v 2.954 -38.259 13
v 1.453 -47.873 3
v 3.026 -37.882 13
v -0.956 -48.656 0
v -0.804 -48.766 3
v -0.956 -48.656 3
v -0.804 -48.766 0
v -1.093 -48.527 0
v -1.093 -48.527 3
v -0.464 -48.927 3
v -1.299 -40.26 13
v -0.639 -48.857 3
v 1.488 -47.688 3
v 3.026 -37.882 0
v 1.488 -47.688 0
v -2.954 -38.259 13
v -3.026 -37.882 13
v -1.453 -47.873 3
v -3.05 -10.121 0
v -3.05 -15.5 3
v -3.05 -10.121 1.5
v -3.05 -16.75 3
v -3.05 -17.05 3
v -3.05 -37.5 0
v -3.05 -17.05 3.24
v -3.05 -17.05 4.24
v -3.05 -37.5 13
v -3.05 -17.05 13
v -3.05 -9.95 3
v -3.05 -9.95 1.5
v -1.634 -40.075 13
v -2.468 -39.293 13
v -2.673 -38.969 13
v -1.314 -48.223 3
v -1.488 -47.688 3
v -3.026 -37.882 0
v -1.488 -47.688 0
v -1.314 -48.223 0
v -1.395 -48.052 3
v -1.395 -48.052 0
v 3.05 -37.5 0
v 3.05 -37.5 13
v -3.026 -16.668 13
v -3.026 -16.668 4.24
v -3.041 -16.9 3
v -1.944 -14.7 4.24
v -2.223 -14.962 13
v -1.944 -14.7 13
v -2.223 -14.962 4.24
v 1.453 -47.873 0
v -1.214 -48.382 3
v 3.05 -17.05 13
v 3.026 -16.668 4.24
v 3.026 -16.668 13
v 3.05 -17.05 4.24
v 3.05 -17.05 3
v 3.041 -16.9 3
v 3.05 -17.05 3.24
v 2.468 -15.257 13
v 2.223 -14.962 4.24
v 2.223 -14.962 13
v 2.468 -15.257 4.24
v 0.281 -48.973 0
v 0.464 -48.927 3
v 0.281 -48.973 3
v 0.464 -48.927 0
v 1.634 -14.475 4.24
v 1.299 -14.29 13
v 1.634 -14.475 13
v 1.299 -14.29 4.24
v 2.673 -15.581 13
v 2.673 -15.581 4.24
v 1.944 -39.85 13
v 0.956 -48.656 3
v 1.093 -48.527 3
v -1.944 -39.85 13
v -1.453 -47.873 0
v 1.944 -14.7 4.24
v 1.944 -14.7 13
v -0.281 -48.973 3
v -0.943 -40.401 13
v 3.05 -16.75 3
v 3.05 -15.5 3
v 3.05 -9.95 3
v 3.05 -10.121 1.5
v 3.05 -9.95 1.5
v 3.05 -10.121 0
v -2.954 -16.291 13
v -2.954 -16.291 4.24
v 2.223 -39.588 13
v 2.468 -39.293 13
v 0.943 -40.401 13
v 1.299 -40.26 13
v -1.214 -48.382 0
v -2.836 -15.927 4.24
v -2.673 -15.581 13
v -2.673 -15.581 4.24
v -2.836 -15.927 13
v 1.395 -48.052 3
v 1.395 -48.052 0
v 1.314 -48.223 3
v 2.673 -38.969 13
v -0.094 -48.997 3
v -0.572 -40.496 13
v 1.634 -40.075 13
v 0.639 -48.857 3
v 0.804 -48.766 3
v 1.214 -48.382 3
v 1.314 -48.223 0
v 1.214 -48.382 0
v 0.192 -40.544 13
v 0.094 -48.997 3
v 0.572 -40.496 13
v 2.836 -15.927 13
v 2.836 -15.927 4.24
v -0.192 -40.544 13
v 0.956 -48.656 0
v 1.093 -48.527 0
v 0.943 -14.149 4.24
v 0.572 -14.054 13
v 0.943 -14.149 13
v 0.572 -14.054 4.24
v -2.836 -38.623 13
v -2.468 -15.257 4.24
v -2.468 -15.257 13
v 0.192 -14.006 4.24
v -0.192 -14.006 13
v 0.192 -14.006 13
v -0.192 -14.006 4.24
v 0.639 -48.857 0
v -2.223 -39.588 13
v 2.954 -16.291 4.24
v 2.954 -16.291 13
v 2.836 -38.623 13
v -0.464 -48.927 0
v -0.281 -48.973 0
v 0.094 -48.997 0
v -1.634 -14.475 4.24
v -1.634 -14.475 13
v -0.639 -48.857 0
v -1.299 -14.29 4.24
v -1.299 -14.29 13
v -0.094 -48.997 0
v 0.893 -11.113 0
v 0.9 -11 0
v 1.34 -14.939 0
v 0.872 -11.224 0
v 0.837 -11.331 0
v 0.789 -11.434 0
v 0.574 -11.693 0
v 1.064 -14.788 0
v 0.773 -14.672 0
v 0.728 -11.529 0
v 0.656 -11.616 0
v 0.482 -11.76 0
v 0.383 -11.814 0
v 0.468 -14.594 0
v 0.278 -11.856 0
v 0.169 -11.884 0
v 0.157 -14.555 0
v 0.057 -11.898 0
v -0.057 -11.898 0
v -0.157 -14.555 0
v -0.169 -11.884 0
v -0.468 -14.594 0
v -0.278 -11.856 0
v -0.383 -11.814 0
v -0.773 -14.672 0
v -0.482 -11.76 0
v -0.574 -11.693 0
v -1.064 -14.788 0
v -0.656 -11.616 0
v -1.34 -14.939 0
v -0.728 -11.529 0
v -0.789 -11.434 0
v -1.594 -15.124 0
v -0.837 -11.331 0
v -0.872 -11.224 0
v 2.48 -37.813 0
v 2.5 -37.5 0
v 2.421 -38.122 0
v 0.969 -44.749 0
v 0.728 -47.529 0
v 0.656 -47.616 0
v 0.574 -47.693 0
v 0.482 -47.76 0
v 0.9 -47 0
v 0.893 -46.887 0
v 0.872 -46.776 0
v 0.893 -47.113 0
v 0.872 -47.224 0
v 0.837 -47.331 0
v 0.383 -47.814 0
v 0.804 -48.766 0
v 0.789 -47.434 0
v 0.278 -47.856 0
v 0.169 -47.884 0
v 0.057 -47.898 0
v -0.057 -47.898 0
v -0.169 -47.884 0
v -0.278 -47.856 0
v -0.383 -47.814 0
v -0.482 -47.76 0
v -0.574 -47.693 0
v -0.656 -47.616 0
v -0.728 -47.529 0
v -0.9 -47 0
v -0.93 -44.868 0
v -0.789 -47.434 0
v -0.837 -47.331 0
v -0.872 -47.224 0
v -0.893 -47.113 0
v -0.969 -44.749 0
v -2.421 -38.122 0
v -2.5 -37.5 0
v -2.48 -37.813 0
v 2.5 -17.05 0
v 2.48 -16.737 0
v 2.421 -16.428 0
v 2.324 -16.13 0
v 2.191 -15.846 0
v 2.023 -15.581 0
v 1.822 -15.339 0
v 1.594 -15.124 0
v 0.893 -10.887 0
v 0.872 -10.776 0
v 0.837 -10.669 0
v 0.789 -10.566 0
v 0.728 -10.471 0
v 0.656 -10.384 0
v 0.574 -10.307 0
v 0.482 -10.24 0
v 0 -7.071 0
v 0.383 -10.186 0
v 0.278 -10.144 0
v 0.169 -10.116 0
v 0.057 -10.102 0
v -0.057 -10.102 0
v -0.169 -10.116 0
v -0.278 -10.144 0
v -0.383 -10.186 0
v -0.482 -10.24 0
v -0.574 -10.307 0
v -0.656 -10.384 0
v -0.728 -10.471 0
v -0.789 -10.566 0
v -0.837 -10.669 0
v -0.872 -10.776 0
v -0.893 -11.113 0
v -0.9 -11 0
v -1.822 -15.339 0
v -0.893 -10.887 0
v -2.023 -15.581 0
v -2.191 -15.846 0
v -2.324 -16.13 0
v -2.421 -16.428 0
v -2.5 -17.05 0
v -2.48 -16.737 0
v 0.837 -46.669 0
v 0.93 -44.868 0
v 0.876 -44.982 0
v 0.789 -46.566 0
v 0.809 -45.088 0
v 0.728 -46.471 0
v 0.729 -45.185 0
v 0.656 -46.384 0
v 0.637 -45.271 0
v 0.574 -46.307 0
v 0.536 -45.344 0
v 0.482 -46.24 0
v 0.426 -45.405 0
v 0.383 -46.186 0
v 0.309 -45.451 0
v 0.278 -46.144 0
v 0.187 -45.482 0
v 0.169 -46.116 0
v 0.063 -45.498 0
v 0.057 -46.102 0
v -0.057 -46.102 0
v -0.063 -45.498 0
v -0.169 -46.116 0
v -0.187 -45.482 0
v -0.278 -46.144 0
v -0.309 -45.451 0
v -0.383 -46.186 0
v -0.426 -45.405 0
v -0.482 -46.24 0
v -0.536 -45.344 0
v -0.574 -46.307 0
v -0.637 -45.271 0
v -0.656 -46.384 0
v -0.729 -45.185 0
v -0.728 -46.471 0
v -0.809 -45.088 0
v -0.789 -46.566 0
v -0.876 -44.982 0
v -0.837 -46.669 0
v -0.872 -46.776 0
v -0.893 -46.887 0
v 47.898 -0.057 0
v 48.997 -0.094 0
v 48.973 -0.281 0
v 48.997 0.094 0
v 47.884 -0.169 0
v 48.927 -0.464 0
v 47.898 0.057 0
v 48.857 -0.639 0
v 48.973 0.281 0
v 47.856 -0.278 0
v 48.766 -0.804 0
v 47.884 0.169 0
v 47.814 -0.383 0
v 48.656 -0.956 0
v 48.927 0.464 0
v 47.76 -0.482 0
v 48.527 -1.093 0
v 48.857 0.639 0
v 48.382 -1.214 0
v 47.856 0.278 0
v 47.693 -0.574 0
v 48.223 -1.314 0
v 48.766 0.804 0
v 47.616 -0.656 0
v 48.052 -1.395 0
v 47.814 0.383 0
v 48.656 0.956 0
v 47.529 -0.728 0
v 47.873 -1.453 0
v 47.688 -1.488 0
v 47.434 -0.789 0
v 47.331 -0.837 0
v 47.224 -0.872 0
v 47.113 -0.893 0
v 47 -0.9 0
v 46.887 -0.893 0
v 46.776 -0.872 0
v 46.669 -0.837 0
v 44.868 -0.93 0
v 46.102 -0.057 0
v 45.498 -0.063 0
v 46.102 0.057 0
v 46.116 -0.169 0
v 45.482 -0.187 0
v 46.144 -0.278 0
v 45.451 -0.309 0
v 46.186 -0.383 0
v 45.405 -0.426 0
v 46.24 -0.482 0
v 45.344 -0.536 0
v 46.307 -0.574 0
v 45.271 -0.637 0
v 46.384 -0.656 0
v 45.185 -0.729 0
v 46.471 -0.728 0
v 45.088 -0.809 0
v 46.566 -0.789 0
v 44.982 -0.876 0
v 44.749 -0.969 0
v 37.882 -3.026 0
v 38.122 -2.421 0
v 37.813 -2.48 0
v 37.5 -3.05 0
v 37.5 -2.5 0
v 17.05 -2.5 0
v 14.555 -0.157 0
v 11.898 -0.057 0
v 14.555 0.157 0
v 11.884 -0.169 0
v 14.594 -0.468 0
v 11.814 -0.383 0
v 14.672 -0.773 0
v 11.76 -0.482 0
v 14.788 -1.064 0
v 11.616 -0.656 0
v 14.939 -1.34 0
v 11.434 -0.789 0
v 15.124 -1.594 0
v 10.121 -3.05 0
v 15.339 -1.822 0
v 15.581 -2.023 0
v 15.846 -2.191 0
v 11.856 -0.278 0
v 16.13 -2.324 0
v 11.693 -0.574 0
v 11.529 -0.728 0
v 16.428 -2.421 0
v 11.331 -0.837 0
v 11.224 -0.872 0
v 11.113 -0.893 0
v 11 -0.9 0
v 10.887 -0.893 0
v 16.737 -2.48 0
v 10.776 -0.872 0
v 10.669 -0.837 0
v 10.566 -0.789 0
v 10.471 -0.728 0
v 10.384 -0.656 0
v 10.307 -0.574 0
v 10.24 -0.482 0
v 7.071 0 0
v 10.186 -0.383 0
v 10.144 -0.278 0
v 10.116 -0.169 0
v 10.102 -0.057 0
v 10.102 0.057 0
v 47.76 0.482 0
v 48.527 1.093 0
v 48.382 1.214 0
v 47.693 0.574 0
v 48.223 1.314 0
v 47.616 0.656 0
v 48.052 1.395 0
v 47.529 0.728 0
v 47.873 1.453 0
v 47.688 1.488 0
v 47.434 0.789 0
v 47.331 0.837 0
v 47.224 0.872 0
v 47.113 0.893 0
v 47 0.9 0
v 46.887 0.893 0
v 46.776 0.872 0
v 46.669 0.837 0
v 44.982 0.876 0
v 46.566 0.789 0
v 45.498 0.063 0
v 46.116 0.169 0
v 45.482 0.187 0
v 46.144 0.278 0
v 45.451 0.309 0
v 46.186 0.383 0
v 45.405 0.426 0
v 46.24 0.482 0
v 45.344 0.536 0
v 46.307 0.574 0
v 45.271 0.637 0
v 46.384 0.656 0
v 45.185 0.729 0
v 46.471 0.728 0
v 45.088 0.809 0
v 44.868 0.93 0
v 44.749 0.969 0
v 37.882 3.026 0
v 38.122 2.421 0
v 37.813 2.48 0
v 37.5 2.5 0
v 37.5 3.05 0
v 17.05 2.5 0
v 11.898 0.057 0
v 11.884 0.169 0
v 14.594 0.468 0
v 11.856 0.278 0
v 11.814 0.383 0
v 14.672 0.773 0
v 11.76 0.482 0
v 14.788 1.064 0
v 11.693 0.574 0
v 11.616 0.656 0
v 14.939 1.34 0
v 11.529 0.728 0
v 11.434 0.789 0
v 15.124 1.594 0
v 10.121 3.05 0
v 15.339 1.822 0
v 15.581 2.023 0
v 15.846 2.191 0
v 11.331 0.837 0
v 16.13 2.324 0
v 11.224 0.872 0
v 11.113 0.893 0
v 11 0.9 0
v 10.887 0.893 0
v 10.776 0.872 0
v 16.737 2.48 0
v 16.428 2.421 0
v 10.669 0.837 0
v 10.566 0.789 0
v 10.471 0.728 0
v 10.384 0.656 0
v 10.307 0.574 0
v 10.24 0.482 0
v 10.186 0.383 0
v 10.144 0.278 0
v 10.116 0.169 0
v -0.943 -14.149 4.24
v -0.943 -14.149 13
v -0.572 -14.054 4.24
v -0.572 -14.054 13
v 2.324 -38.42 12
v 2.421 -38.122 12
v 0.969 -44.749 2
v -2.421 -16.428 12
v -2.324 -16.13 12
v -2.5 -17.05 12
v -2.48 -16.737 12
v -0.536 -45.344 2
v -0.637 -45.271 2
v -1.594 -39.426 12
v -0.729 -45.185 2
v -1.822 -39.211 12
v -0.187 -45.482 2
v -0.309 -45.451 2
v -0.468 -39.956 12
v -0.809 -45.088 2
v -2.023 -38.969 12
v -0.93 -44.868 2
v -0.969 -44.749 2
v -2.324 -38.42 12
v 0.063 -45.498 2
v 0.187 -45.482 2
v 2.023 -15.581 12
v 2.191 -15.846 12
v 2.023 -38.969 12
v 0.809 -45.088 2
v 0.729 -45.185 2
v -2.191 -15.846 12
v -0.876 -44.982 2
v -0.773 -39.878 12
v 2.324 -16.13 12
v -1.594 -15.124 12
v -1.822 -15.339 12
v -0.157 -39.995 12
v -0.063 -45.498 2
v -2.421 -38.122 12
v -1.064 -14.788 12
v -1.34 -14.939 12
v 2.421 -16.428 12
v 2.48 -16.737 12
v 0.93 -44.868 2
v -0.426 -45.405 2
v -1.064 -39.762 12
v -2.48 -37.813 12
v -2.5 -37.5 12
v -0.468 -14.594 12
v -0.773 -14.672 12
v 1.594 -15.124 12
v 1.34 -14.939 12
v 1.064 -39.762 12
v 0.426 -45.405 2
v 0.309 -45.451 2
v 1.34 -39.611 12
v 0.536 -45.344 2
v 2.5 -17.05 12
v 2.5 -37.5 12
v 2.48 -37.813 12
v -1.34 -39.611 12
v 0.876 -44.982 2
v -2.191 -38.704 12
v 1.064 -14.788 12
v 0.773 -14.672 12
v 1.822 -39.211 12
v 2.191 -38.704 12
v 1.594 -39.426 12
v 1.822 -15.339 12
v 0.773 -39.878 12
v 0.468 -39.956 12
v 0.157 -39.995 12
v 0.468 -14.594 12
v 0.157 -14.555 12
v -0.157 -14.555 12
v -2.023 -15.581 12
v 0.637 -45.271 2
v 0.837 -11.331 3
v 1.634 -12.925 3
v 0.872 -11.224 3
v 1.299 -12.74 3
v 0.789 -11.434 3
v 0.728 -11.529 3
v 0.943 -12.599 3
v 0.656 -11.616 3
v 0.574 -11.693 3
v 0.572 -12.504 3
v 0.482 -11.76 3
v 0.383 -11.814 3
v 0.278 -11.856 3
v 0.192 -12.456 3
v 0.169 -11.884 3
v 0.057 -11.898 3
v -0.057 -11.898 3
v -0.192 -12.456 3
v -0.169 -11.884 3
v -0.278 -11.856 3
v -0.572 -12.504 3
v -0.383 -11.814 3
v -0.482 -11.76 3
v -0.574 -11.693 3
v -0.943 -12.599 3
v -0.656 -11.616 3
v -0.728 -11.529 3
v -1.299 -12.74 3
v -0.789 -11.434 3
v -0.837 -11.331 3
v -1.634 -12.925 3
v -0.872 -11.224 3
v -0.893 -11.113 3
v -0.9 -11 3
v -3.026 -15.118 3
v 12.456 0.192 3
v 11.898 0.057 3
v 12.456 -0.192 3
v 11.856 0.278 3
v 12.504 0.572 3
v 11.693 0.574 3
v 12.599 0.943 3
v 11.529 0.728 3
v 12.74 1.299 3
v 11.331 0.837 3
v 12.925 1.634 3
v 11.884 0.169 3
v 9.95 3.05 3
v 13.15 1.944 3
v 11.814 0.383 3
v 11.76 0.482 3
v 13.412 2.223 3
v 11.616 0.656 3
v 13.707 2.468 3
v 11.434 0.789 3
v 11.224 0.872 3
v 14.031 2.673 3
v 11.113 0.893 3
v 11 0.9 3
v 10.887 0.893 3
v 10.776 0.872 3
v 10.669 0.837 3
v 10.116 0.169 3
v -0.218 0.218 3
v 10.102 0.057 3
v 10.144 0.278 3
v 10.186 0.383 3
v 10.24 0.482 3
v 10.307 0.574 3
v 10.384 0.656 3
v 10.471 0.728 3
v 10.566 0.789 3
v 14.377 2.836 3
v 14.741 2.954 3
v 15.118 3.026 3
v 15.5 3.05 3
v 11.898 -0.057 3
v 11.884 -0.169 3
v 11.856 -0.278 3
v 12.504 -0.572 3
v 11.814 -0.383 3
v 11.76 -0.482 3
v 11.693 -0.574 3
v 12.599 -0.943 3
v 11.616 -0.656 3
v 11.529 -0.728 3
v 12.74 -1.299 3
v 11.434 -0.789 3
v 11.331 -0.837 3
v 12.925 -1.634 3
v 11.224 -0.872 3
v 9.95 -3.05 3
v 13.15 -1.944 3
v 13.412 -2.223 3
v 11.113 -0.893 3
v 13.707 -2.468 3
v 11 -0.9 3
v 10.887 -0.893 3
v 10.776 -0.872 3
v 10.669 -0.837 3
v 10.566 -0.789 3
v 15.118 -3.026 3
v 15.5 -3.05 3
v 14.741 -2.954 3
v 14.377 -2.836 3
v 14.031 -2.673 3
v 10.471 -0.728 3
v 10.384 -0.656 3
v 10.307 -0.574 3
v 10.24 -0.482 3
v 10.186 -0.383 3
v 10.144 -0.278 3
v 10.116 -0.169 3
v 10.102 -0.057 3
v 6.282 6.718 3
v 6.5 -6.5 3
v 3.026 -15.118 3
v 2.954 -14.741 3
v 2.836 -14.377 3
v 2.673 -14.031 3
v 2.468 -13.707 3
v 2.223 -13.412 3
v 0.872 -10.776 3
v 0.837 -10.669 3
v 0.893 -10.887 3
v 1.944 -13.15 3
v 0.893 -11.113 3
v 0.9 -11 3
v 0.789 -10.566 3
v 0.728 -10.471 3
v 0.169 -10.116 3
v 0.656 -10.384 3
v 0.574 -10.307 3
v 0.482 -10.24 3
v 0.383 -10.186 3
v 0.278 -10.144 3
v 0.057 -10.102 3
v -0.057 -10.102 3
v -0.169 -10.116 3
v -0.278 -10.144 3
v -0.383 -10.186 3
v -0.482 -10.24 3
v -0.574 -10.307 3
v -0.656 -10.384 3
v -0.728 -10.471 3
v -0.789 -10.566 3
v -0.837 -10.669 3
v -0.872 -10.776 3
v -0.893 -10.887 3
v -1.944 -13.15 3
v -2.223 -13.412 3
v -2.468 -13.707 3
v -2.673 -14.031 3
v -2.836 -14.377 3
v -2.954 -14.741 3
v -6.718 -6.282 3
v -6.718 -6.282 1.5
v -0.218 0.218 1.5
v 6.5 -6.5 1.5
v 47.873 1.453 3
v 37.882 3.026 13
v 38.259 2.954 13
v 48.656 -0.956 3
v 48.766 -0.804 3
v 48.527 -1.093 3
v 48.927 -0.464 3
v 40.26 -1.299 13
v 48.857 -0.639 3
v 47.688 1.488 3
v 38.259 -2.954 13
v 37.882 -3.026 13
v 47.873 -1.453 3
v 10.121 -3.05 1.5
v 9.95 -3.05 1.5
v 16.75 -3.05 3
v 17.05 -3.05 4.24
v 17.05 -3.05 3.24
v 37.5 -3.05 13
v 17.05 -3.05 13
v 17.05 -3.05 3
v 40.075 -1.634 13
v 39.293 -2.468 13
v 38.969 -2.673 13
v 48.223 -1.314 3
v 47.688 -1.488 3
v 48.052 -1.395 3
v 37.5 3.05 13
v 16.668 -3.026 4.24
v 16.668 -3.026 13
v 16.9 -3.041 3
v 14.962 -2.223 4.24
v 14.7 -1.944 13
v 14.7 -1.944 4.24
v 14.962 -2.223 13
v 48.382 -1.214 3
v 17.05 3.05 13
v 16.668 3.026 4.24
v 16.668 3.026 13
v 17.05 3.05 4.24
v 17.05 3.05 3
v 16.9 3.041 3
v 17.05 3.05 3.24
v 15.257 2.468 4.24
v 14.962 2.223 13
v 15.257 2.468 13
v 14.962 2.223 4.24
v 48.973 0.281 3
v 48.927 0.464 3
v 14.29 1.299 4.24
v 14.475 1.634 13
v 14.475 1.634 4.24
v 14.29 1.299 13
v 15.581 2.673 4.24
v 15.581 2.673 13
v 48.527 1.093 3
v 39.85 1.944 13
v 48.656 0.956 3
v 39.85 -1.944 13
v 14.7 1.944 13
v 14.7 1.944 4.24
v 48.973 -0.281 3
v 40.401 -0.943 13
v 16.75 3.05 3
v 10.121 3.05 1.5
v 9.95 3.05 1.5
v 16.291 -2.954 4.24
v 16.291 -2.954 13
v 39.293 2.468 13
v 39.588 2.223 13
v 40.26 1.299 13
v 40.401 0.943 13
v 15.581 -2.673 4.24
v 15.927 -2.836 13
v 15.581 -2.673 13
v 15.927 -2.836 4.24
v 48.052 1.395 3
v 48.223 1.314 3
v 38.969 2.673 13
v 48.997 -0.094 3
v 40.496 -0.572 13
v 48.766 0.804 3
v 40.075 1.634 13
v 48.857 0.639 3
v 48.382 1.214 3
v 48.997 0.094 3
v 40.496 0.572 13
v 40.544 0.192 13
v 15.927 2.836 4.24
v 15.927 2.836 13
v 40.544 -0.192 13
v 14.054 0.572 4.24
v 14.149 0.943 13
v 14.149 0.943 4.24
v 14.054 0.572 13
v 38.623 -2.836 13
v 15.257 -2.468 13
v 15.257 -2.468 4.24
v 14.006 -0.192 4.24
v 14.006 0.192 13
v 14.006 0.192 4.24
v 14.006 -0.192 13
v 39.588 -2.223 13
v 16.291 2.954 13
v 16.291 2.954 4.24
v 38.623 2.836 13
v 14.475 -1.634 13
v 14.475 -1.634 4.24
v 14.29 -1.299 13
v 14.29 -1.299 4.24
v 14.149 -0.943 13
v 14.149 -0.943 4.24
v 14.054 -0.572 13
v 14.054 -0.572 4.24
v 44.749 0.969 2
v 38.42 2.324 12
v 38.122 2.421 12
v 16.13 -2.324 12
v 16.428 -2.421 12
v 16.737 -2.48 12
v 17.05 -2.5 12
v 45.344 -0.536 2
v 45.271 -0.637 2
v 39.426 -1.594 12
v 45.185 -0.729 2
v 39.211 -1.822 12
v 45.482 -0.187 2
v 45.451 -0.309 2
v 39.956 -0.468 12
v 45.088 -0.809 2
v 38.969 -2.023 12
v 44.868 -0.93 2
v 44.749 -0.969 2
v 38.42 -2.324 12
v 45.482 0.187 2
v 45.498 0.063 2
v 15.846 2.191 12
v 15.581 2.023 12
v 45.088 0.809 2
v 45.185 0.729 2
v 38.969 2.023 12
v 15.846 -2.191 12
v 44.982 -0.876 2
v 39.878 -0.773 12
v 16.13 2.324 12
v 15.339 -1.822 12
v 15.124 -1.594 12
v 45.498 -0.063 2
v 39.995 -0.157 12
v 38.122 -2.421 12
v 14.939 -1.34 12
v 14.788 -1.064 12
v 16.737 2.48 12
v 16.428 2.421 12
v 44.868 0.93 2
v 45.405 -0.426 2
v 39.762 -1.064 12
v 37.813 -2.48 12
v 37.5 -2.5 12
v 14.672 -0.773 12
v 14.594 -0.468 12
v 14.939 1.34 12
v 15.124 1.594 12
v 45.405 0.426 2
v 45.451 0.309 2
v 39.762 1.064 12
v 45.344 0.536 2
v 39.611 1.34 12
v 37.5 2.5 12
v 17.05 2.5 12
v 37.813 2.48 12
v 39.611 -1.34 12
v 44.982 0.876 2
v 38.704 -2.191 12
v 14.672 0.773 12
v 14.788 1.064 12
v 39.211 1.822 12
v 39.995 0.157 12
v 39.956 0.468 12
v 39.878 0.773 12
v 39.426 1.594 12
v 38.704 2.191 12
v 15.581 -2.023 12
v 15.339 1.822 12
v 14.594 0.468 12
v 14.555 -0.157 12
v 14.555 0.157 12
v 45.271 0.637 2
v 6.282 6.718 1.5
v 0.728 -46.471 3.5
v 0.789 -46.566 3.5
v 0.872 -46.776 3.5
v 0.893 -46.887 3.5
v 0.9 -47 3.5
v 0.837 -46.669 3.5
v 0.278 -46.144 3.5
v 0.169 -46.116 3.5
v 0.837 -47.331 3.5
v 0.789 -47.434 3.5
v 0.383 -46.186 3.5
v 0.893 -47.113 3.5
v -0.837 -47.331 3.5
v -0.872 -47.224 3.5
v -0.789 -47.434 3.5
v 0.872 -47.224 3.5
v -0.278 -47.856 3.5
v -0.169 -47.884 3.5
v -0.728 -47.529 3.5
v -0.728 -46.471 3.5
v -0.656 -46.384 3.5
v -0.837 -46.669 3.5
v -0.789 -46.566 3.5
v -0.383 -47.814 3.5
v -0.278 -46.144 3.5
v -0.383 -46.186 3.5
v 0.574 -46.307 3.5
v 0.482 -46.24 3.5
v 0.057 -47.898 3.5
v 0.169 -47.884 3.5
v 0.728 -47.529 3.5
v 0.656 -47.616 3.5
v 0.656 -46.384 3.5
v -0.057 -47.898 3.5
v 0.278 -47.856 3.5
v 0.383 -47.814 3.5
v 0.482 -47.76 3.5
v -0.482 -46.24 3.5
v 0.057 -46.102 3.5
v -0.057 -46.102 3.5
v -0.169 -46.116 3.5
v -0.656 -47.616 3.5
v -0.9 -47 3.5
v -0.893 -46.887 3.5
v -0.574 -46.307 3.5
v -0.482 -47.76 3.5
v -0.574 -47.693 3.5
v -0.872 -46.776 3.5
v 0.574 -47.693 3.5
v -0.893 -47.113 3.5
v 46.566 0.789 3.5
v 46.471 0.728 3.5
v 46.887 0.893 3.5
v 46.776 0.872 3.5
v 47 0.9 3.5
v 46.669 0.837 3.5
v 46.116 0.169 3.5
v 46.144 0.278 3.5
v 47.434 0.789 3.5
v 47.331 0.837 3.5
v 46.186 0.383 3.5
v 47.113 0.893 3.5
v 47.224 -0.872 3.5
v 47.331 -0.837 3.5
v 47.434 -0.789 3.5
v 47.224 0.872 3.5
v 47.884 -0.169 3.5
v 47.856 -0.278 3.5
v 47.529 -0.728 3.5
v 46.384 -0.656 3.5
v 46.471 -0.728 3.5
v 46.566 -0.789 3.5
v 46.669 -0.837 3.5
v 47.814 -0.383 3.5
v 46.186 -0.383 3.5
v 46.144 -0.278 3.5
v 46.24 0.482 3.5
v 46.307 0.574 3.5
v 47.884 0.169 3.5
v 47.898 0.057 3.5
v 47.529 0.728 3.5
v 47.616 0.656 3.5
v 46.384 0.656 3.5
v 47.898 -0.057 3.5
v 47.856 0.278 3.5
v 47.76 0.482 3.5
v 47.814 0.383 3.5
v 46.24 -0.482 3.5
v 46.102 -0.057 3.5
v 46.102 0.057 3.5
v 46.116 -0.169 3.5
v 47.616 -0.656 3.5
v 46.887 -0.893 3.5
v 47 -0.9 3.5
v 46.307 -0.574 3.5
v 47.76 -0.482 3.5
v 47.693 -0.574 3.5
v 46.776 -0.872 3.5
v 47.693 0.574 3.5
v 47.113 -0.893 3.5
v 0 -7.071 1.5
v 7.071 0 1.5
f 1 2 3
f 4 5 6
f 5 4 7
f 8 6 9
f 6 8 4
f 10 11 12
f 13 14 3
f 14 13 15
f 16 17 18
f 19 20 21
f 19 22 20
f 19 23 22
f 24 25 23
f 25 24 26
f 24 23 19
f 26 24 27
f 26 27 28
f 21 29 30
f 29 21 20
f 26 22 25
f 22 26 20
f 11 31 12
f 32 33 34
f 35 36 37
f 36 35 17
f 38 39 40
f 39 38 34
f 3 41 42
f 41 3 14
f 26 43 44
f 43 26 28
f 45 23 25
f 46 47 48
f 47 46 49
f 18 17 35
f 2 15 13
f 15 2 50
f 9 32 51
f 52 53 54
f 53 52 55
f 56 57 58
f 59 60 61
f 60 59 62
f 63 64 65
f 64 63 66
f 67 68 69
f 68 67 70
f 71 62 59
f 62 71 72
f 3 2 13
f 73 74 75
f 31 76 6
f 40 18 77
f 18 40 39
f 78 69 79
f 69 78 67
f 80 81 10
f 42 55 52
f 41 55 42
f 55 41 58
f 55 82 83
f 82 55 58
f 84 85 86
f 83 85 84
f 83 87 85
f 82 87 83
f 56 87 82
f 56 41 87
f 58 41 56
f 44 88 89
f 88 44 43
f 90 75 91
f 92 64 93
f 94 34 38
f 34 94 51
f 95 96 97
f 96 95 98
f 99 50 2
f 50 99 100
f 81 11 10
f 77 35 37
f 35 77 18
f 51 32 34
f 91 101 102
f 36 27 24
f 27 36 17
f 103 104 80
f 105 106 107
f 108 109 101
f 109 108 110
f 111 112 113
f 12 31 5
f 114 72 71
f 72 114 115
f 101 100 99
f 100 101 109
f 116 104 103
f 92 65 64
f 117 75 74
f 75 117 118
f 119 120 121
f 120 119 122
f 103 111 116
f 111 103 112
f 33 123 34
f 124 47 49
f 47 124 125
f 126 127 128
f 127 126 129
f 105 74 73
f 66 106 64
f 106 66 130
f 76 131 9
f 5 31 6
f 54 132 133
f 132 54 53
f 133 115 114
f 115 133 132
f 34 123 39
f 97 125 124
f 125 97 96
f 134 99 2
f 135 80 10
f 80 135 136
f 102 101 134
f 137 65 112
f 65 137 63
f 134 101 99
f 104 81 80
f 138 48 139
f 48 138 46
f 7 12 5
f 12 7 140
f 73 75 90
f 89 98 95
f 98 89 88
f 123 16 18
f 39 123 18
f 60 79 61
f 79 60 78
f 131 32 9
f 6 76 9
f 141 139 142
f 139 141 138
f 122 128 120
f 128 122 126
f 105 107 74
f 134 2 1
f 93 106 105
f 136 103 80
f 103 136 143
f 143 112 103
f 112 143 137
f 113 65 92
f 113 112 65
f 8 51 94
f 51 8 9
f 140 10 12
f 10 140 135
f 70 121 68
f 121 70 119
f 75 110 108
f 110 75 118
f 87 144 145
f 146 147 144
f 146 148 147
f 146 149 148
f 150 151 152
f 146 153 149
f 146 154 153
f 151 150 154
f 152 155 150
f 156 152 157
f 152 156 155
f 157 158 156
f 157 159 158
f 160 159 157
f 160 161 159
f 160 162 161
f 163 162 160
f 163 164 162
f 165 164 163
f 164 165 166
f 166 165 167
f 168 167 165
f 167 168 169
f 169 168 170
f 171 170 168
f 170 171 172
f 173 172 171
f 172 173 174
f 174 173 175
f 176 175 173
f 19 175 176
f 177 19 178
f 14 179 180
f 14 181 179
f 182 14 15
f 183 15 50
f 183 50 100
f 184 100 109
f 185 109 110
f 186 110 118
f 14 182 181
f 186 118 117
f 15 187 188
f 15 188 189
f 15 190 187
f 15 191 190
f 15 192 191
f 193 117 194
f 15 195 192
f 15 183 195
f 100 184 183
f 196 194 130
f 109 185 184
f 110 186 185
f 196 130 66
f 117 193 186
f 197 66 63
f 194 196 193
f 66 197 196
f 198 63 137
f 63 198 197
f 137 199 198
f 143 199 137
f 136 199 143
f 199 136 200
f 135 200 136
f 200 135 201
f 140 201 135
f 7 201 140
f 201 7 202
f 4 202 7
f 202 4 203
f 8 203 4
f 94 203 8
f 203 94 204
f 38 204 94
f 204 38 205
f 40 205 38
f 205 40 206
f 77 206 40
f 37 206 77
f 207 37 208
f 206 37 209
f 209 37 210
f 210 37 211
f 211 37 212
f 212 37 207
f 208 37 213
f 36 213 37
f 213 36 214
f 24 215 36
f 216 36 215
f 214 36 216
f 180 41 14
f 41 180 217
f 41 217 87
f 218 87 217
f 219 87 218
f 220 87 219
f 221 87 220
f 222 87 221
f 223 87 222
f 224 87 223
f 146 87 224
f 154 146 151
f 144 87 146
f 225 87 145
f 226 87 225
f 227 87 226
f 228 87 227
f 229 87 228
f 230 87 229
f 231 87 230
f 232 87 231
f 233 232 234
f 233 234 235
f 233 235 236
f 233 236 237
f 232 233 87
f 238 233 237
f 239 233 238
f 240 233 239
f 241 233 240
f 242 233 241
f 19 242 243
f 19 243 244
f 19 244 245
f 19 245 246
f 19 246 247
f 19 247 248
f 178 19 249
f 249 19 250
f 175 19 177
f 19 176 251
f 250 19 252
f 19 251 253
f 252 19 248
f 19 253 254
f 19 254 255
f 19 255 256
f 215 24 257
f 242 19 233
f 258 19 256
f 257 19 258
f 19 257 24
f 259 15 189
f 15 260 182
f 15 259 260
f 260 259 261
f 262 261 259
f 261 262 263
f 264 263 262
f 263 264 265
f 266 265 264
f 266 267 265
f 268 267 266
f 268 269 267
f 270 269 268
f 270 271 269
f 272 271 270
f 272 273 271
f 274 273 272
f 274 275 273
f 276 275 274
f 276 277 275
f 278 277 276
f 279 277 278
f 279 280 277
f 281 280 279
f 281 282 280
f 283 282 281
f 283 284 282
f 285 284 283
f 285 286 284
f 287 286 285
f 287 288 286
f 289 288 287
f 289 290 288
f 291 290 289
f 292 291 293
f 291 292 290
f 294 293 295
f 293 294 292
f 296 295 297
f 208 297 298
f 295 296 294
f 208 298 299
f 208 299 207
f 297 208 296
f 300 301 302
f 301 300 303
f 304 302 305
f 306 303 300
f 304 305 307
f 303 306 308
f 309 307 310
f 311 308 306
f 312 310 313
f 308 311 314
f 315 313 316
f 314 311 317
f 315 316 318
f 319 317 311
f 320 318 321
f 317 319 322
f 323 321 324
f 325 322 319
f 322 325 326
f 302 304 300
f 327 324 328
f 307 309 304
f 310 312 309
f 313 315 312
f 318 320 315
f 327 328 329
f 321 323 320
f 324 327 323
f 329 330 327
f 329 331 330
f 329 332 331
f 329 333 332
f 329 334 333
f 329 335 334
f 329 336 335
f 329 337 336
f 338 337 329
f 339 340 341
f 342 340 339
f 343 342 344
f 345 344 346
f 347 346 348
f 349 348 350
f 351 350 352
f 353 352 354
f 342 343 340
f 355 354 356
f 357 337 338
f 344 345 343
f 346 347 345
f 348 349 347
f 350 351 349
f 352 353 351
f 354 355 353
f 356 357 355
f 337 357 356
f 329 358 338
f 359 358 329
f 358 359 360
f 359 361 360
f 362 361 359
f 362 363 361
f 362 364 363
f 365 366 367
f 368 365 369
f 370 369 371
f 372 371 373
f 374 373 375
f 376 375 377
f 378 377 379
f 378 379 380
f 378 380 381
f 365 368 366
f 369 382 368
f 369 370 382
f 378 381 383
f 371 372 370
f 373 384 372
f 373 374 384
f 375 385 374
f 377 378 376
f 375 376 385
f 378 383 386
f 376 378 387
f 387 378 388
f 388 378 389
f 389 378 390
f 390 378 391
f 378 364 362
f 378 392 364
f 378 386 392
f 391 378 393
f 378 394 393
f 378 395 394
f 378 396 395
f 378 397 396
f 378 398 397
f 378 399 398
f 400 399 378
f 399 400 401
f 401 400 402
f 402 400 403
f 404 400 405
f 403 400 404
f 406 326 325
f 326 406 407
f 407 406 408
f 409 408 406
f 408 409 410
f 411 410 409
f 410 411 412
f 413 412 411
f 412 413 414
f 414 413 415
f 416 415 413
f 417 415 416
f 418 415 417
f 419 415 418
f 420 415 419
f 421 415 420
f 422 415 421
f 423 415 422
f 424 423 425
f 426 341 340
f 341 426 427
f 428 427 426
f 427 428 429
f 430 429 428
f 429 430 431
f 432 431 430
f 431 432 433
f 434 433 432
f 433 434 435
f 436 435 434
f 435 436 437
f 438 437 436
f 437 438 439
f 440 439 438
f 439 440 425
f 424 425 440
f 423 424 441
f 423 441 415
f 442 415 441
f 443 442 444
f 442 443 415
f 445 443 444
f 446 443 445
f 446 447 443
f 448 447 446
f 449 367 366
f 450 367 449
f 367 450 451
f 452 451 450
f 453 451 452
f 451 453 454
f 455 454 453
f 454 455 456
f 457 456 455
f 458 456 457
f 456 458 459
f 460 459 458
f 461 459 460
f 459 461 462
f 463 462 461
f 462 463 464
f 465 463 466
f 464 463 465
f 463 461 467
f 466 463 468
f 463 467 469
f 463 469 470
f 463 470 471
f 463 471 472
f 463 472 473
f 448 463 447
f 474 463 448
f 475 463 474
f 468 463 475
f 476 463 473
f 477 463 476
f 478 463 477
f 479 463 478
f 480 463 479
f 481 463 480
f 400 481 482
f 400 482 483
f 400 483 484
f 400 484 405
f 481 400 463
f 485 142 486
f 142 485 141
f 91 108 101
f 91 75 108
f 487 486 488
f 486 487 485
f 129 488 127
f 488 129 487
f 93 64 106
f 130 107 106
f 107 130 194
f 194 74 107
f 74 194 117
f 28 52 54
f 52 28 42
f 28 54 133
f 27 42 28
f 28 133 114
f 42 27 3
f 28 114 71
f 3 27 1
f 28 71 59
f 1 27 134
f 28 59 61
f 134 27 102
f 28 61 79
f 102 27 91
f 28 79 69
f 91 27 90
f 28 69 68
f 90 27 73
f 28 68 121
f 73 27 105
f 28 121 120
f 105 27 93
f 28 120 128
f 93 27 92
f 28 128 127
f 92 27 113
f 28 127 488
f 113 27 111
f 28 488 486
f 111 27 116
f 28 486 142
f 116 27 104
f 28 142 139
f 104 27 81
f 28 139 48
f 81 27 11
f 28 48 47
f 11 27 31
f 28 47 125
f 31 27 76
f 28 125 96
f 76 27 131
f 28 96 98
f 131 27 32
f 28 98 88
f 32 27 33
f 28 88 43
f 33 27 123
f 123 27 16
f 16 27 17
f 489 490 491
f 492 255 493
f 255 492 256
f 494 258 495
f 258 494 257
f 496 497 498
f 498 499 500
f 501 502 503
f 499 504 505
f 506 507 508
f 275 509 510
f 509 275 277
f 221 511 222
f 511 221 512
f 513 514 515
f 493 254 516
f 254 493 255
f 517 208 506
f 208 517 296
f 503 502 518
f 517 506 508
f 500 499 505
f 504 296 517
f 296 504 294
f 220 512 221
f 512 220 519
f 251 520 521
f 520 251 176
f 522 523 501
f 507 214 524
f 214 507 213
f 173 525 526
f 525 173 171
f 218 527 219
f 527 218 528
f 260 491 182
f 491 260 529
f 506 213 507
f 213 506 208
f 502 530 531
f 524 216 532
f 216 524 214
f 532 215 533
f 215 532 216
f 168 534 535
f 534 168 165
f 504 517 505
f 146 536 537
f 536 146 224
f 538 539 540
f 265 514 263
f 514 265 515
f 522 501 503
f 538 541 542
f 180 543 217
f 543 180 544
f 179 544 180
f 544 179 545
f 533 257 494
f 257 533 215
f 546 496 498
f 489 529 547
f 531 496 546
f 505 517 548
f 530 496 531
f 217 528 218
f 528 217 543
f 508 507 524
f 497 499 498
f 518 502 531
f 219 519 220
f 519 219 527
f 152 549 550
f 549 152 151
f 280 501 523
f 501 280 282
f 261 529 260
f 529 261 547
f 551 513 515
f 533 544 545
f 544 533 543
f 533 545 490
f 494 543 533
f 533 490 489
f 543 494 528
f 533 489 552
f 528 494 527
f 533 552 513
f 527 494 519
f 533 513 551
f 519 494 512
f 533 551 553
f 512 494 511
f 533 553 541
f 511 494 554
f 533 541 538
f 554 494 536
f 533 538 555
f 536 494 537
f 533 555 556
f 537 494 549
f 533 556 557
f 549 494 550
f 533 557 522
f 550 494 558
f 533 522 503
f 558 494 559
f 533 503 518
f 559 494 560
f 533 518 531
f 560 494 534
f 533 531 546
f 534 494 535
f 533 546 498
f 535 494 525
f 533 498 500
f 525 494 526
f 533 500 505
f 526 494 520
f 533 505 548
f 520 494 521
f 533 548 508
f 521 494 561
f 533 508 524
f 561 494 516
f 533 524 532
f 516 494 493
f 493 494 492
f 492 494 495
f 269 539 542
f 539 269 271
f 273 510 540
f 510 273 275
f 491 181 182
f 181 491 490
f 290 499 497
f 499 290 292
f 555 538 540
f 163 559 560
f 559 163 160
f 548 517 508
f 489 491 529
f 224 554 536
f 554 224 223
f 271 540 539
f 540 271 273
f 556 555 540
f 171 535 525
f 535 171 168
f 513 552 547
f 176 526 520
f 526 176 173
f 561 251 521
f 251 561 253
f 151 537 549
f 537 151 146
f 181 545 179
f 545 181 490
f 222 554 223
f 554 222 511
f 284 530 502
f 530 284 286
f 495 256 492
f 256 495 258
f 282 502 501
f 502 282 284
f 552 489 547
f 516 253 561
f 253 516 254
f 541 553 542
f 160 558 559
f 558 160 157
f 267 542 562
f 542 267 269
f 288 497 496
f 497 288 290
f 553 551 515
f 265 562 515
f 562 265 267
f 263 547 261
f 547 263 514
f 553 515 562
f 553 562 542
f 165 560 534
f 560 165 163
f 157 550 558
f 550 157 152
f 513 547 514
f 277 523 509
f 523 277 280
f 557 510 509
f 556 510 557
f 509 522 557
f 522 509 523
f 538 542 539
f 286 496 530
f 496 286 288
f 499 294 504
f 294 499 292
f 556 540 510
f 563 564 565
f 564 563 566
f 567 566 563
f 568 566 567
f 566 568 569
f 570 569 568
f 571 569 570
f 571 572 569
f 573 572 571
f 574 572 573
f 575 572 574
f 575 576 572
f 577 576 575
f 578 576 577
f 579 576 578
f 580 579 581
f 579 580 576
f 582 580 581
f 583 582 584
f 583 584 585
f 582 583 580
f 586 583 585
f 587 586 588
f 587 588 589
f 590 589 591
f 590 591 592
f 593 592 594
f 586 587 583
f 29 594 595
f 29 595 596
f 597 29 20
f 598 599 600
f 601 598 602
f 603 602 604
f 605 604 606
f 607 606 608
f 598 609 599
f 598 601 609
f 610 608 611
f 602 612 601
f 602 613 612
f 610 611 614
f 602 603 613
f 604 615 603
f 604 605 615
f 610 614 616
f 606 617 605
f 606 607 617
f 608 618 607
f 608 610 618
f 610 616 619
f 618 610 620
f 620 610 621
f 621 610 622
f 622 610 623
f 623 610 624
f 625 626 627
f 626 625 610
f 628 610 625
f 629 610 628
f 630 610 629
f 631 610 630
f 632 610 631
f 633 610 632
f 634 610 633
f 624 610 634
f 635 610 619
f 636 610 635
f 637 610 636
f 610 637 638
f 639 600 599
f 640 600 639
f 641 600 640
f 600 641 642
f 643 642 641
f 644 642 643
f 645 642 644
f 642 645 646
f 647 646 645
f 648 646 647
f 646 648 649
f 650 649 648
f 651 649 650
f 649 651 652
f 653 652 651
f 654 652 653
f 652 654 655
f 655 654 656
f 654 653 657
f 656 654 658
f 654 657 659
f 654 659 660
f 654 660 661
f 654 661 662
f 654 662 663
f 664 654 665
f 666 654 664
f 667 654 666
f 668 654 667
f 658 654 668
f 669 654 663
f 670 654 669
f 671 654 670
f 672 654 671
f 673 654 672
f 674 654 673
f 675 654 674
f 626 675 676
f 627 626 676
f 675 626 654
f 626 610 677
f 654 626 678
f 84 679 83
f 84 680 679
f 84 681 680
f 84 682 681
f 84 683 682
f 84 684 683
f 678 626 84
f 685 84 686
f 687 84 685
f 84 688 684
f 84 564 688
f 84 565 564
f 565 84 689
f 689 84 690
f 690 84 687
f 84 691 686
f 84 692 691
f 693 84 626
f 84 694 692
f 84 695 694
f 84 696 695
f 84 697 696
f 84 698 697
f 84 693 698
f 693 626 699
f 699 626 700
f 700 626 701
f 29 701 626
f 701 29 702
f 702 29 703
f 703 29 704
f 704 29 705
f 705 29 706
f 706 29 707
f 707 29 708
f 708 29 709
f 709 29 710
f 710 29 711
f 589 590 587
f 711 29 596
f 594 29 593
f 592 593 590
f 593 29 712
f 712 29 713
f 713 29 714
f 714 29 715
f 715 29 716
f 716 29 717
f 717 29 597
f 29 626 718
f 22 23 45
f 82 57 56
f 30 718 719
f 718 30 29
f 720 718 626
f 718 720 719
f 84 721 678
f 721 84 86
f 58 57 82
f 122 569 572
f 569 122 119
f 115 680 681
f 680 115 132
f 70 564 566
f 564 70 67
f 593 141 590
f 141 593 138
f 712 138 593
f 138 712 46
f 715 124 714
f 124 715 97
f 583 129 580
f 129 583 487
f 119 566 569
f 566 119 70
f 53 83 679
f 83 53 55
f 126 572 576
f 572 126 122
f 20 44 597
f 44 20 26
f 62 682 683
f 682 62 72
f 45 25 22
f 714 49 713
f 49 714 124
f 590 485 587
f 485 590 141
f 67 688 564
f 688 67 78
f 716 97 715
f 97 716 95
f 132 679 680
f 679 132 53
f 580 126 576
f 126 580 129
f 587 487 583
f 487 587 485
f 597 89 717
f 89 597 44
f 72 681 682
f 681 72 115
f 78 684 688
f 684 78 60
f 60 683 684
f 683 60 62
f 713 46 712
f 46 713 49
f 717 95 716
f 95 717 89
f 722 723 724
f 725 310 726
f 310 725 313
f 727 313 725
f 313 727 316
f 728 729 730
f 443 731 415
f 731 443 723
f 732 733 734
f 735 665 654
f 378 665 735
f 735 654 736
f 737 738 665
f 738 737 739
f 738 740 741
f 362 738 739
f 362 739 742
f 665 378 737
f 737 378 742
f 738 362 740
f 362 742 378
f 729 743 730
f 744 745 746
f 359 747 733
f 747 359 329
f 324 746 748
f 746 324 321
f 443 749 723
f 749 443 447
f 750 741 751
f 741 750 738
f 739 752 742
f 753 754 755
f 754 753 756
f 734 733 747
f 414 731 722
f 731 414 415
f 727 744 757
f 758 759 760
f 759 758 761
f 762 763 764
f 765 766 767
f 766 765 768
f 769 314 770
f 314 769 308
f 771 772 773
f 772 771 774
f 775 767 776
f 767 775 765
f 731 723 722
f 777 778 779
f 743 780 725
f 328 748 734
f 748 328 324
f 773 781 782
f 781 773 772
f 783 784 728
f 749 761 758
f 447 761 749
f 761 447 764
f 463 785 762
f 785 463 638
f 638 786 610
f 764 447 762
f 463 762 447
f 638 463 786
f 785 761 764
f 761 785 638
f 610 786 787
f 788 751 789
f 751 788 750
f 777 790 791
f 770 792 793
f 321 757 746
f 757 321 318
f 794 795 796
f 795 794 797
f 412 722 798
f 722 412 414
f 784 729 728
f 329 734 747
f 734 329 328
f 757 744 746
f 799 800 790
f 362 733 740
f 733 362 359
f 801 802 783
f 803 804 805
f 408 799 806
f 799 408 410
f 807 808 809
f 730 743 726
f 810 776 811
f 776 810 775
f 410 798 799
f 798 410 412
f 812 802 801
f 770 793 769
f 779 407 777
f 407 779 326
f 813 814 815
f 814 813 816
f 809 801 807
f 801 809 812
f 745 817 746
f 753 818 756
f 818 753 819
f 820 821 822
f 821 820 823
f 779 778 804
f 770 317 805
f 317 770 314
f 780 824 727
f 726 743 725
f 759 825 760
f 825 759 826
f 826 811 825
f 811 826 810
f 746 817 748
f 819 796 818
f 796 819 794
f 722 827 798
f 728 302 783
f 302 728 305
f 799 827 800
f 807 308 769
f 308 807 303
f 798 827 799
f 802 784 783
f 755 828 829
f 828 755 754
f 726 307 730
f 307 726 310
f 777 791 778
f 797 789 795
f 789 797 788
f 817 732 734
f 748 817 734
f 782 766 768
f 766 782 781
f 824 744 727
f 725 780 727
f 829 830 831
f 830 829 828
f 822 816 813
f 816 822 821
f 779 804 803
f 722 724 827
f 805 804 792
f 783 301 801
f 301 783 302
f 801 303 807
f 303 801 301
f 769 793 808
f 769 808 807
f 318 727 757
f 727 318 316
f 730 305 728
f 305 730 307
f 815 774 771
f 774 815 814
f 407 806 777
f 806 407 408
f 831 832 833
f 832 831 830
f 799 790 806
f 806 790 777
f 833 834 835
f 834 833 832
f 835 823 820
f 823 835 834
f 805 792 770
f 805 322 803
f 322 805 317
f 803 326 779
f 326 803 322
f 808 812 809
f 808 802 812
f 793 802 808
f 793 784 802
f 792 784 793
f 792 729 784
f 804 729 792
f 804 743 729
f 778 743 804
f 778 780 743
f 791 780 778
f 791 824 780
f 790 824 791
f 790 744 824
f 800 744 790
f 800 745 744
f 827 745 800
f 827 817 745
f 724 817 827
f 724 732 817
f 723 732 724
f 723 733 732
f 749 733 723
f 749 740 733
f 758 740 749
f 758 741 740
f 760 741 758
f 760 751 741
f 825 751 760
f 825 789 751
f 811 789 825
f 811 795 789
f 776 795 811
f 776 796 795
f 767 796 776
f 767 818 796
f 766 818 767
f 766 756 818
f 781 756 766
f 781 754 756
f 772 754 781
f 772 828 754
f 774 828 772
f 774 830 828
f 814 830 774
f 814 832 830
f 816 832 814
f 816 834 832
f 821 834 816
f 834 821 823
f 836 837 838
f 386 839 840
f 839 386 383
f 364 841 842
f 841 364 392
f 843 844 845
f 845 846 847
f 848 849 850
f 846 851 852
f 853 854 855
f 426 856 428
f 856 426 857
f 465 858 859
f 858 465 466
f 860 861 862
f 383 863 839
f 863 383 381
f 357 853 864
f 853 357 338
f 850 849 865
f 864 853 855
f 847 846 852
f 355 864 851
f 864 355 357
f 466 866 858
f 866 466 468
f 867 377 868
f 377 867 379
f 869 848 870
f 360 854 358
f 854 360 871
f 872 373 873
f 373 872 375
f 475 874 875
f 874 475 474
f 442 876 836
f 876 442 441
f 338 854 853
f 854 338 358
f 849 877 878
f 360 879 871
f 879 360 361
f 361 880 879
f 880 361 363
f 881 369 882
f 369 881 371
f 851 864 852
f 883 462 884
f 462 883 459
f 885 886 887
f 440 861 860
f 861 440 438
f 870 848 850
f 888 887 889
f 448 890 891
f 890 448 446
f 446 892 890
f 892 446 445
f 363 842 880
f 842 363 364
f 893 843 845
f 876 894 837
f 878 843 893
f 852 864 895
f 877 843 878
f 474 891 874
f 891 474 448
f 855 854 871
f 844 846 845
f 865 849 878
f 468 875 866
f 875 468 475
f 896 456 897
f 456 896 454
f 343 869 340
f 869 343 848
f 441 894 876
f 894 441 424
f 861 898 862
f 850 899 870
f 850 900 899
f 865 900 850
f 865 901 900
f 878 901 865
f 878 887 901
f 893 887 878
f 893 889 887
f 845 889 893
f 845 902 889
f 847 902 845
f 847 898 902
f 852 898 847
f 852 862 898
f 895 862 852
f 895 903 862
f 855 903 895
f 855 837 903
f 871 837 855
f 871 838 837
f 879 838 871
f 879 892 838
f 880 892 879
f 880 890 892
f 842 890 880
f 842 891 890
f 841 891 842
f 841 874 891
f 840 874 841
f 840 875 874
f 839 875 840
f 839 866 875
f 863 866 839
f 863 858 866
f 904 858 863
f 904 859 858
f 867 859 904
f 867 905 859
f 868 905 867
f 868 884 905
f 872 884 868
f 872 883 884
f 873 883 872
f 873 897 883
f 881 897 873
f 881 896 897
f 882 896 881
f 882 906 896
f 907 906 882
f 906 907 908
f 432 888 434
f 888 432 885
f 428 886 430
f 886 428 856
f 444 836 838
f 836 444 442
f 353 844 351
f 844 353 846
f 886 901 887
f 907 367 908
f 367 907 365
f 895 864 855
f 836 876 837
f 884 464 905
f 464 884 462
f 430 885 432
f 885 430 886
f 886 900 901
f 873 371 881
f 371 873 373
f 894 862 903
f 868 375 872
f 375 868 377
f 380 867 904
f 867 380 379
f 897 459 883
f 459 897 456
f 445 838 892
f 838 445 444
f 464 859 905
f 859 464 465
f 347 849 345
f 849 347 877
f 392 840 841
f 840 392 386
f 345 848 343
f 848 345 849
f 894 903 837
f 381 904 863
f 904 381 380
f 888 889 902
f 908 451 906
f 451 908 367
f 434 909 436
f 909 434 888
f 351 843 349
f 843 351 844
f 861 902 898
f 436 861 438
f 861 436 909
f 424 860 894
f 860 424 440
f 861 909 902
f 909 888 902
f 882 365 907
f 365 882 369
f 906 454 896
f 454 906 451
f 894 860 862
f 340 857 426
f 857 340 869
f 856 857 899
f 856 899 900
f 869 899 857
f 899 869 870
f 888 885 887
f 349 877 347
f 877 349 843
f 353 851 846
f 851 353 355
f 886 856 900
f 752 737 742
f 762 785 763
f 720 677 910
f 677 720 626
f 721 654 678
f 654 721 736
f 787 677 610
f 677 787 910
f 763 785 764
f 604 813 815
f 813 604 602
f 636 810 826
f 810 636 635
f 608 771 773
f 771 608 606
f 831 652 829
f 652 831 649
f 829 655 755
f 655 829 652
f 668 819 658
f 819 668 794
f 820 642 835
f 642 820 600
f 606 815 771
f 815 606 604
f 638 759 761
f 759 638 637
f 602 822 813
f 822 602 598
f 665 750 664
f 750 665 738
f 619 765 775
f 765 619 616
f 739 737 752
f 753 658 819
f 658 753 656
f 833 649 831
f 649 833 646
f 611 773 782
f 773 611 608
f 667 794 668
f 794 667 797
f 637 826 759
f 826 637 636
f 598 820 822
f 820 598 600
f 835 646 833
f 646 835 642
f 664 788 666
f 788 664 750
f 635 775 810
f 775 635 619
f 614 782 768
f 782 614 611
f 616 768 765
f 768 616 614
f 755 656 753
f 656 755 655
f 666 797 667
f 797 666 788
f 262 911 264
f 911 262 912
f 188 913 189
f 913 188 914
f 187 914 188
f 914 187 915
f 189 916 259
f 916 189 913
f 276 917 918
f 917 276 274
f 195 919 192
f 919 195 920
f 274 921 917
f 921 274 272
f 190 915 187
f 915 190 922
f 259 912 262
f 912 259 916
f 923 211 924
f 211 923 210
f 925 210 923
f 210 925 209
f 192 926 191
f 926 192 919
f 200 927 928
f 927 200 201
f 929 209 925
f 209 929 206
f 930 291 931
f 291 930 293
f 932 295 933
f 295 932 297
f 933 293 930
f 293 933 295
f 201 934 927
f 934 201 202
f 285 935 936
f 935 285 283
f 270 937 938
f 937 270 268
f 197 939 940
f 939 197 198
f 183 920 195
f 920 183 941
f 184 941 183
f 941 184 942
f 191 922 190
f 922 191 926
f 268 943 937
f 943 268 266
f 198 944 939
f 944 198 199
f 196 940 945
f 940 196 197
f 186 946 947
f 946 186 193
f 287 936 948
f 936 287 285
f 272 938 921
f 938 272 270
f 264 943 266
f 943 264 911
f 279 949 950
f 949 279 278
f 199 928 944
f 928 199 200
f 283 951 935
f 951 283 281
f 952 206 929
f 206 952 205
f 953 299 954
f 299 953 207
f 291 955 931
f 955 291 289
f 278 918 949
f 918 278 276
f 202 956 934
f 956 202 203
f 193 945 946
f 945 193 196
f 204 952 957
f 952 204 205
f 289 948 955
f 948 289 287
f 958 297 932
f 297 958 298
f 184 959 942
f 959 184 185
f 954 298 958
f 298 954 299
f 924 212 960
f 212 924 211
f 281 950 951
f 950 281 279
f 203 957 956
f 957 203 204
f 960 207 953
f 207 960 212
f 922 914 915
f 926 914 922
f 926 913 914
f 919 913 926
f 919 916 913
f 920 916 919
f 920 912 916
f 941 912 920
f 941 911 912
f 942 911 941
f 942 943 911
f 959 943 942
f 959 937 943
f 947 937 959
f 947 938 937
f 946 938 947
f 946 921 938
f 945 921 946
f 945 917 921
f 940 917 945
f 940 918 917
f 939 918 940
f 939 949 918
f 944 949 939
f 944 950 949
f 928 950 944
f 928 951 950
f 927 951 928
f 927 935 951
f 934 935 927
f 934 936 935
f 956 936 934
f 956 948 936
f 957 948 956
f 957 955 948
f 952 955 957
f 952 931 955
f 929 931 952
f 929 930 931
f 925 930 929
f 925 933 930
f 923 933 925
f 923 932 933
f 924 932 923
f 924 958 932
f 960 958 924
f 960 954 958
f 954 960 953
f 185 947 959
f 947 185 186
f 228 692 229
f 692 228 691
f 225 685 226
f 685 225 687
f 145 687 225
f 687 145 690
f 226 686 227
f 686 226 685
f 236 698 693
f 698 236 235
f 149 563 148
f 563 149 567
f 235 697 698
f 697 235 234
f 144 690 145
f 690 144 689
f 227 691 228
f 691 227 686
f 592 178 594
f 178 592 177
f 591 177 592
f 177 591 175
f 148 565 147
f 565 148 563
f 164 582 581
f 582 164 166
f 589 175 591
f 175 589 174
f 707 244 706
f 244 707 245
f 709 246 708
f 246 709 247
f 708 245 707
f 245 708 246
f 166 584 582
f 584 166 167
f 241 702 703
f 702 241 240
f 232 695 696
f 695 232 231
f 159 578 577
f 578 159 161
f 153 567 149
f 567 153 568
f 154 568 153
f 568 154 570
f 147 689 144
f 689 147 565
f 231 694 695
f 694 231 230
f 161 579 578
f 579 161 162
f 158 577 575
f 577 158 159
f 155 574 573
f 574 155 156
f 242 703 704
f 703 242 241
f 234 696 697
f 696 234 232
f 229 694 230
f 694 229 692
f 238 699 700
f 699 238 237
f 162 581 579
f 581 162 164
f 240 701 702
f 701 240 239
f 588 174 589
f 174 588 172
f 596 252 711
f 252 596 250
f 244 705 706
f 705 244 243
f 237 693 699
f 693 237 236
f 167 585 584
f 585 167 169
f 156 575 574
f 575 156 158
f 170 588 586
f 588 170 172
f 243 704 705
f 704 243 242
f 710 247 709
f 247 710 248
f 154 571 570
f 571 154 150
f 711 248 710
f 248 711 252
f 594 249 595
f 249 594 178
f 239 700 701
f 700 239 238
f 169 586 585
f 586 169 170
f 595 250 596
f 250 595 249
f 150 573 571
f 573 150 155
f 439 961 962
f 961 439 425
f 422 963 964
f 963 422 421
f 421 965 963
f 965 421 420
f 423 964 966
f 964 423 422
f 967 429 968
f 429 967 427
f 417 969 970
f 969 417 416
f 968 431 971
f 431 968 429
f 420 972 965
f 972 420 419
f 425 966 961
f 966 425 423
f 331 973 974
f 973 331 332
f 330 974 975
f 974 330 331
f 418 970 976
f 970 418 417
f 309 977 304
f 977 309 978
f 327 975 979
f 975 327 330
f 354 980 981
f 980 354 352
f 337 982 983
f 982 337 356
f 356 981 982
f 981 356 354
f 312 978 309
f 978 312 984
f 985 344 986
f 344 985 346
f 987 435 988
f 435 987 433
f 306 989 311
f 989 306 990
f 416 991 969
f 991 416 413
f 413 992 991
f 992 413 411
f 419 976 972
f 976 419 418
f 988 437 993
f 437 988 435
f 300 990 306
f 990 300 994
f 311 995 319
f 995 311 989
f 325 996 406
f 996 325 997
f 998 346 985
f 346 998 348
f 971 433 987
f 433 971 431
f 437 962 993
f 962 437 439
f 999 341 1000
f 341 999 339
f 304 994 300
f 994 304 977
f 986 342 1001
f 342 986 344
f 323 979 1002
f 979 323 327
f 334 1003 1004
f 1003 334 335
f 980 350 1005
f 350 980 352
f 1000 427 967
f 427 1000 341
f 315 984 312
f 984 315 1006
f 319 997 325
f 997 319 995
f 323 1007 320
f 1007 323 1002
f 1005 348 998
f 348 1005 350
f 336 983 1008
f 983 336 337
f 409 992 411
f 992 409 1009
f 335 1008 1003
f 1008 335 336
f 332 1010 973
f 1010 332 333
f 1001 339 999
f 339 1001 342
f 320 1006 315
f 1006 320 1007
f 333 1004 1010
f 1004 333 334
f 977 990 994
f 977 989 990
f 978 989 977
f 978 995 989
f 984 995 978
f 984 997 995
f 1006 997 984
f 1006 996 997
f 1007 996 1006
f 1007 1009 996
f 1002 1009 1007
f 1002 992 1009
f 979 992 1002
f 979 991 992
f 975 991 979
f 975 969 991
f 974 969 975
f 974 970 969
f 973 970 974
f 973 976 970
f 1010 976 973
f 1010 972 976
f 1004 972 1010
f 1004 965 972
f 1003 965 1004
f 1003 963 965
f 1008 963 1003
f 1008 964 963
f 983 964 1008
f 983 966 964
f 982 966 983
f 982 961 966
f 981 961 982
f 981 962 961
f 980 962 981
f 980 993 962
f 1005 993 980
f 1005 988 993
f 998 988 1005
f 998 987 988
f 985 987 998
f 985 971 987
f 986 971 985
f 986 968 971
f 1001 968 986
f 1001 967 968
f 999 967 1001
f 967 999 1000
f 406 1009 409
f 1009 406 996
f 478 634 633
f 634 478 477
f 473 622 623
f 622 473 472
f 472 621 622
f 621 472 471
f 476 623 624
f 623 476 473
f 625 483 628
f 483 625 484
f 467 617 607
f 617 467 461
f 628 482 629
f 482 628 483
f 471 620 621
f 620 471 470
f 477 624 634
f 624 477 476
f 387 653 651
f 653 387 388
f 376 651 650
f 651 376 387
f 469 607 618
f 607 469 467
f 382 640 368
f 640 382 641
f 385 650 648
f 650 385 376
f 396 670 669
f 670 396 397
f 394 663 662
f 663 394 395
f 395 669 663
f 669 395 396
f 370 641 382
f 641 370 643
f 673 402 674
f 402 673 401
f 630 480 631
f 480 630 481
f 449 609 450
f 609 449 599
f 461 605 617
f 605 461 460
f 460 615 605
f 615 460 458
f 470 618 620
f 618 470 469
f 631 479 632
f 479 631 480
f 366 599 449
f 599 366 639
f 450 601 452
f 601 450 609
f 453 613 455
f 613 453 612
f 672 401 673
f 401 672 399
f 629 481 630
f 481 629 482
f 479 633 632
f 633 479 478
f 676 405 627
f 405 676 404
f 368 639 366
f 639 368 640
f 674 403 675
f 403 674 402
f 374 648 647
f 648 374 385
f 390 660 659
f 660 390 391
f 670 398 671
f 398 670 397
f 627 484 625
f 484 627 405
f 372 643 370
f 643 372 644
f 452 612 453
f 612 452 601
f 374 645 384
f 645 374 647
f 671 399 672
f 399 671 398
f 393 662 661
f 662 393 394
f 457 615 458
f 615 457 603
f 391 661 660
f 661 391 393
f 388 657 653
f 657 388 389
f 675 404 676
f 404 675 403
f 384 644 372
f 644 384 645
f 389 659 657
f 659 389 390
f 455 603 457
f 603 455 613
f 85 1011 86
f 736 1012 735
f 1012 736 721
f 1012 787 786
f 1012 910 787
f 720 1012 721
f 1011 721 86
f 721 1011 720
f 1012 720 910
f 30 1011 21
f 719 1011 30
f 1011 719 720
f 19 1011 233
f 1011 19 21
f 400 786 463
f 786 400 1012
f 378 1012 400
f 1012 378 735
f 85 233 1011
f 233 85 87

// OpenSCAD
$fn=50;

$armWidth=6.1;
$armLength=49;
$armHeight=13;
$screwDiameter=1.8;
$screwInnerDistance=11;
$screwOuterDistance=47;

$batteryHeight=18.5;
$batteryWidth=12.5;
$batteryHeightPadding=1.5;
$batteryHeightTotal=$batteryHeight+$batteryHeightPadding;

%translate([2.55,-25,0]) cube([0.5,0.5,0.5]);
%translate([0,-35,0]) cube([$armWidth,0.5,0.5], center=true);

module arm() {

    module armBody() {
        translate([0,-$armLength+1.5,0]){
            hull() {
                cylinder(h=3, d=3);
                
                translate([0,10,0]) {
                    cylinder(h=$armHeight, d=$armWidth);
                    cylinder(h=1, d=$armWidth);
                }
                
                translate([0,$armLength-(1.5+($armWidth/2))-14,0]) {
                    cylinder(h=$armHeight, d=$armWidth);
                    cylinder(h=1, d=$armWidth);
                }
            }
        }
    }
    
    module armShell() {
        difference() {
            armBody();
            
            translate([0,-$armLength+1.5,-1]){
                hull() {
                    
                    translate([0,3,0]) {
                        cylinder(h=3, d=2);
                    }
                    
                    translate([0,10,0]) {
                        cylinder(h=$armHeight, d=$armWidth-1.1);
                        cylinder(h=1, d=$armWidth-1.5);
                    }
                    
                    translate([0,$armLength-(1.5+($armWidth/2))-14,0]) {
                        cylinder(h=$armHeight, d=$armWidth-1.1);
                        cylinder(h=1, d=$armWidth-1.5);
                    }
                }
            }
        }
    }
    
    module armScrewsBlocks() {
        translate([0,-$screwInnerDistance,0]) {
            cylinder(d1=$armWidth,h=4, d2=5);
        }
    }
    
    module batteryPlate() {
//        hull() {
//            #translate([0,-14,0]) cylinder(d=4,h=3);
//            #translate([14,0,0]) cube([1,1,3]);
//            translate([-14,0,0]) cube([1,1,3]);
//        }
        difference() {
//            intersection() {
//                translate([0,-19.8,0]) rotate([0,0,45]) cube([14,14,3]);
//                translate([-18/2,-20,0]) cube([18,20,3]);                
//            }
            union() {
                translate([0,-13,0]) rotate([0,0,45]) cube([9.5,9.5,3]);
                translate([0,-11,3/2]) cube([$armWidth,15,3], center=true);
                hull() {
                    translate([0,-15.5,2]) cylinder(d=$armWidth,h=1);
                    translate([0,-18,4]) cylinder(d=$armWidth,h=1);
                }
            }
            hull() {
                translate([0,-17,-0.5]) cylinder(d=5,h=8);
                translate([0,-20,-0.5]) cylinder(d=5,h=8);
            }
        }
    }
    
    difference() {
        union() {
            armShell();
//            #armScrewsBlocks();
            batteryPlate();
        }
    }
}

module armScrewsHoles() {

    module armScrewHole() {
        translate([0,-$screwOuterDistance,0]) {
            cylinder(h=3.5, d=$screwDiameter);
        }
        translate([0,-$screwInnerDistance,0]) {
            cylinder(h=4, d=$screwDiameter);
        }
    }
    
    armScrewHole();
    rotate([0,0,90]) armScrewHole();
    rotate([0,0,180]) armScrewHole();
    rotate([0,0,270]) armScrewHole();
}

module arms() {
    arm();
    rotate([0,0,90]) arm();
//    rotate([0,0,180]) arm();
//    rotate([0,0,270]) arm();
}

module batteryHolderCover() {
    rotate([0,0,45]) {
        translate([0,0,($batteryHeightTotal+1)/2]) {
            cube([$batteryWidth+2.5,25,$batteryHeightTotal+1], center=true);
        }
    }
}

module batteryHolderCoverSplit() {
    rotate([0,0,45]) {
        translate([0,6,($batteryHeightTotal+1)/2]) {
            cube([$batteryWidth+1.5,8,$batteryHeightTotal+1], center=true);
        }
        translate([0,-6,($batteryHeightTotal+1)/2]) {
            cube([$batteryWidth+1.5,8,$batteryHeightTotal+1], center=true);
        }
    }
}

module batteryHolderHollow() {
    rotate([0,0,45]) {
        translate([0,0,($batteryHeightTotal)/2]) {
            cube([$batteryWidth,25+1,$batteryHeightTotal], center=true);
        }
    }
}

module batteryHolderFillet() {
    rotate([0,0,45]) {
        translate([$batteryWidth/2,0,$batteryHeightTotal]) {
            rotate([0,45,0]) {
                cube([1,25,1], center=true);
            }
        }
        translate([-$batteryWidth/2,0,$batteryHeightTotal]) {
            rotate([0,45,0]) {
                cube([1,25,1], center=true);
            }
        }
    }
}

difference() {
    union() {
        arms();
//        batteryHolderCover();
    }
//    batteryHolderHollow();
    armScrewsHoles();
    
    rotate([0,0,45]) translate([0,0,1.5/2]) cube([40,10,1.5], center=true);
    rotate([0,0,-45]) translate([0,0,1.5/2]) cube([40,10,1.5], center=true);
}

//batteryHolderFillet();

//%rotate([0,0,45]) translate([0,0,-1]) cube([28,28,3], center=true);
